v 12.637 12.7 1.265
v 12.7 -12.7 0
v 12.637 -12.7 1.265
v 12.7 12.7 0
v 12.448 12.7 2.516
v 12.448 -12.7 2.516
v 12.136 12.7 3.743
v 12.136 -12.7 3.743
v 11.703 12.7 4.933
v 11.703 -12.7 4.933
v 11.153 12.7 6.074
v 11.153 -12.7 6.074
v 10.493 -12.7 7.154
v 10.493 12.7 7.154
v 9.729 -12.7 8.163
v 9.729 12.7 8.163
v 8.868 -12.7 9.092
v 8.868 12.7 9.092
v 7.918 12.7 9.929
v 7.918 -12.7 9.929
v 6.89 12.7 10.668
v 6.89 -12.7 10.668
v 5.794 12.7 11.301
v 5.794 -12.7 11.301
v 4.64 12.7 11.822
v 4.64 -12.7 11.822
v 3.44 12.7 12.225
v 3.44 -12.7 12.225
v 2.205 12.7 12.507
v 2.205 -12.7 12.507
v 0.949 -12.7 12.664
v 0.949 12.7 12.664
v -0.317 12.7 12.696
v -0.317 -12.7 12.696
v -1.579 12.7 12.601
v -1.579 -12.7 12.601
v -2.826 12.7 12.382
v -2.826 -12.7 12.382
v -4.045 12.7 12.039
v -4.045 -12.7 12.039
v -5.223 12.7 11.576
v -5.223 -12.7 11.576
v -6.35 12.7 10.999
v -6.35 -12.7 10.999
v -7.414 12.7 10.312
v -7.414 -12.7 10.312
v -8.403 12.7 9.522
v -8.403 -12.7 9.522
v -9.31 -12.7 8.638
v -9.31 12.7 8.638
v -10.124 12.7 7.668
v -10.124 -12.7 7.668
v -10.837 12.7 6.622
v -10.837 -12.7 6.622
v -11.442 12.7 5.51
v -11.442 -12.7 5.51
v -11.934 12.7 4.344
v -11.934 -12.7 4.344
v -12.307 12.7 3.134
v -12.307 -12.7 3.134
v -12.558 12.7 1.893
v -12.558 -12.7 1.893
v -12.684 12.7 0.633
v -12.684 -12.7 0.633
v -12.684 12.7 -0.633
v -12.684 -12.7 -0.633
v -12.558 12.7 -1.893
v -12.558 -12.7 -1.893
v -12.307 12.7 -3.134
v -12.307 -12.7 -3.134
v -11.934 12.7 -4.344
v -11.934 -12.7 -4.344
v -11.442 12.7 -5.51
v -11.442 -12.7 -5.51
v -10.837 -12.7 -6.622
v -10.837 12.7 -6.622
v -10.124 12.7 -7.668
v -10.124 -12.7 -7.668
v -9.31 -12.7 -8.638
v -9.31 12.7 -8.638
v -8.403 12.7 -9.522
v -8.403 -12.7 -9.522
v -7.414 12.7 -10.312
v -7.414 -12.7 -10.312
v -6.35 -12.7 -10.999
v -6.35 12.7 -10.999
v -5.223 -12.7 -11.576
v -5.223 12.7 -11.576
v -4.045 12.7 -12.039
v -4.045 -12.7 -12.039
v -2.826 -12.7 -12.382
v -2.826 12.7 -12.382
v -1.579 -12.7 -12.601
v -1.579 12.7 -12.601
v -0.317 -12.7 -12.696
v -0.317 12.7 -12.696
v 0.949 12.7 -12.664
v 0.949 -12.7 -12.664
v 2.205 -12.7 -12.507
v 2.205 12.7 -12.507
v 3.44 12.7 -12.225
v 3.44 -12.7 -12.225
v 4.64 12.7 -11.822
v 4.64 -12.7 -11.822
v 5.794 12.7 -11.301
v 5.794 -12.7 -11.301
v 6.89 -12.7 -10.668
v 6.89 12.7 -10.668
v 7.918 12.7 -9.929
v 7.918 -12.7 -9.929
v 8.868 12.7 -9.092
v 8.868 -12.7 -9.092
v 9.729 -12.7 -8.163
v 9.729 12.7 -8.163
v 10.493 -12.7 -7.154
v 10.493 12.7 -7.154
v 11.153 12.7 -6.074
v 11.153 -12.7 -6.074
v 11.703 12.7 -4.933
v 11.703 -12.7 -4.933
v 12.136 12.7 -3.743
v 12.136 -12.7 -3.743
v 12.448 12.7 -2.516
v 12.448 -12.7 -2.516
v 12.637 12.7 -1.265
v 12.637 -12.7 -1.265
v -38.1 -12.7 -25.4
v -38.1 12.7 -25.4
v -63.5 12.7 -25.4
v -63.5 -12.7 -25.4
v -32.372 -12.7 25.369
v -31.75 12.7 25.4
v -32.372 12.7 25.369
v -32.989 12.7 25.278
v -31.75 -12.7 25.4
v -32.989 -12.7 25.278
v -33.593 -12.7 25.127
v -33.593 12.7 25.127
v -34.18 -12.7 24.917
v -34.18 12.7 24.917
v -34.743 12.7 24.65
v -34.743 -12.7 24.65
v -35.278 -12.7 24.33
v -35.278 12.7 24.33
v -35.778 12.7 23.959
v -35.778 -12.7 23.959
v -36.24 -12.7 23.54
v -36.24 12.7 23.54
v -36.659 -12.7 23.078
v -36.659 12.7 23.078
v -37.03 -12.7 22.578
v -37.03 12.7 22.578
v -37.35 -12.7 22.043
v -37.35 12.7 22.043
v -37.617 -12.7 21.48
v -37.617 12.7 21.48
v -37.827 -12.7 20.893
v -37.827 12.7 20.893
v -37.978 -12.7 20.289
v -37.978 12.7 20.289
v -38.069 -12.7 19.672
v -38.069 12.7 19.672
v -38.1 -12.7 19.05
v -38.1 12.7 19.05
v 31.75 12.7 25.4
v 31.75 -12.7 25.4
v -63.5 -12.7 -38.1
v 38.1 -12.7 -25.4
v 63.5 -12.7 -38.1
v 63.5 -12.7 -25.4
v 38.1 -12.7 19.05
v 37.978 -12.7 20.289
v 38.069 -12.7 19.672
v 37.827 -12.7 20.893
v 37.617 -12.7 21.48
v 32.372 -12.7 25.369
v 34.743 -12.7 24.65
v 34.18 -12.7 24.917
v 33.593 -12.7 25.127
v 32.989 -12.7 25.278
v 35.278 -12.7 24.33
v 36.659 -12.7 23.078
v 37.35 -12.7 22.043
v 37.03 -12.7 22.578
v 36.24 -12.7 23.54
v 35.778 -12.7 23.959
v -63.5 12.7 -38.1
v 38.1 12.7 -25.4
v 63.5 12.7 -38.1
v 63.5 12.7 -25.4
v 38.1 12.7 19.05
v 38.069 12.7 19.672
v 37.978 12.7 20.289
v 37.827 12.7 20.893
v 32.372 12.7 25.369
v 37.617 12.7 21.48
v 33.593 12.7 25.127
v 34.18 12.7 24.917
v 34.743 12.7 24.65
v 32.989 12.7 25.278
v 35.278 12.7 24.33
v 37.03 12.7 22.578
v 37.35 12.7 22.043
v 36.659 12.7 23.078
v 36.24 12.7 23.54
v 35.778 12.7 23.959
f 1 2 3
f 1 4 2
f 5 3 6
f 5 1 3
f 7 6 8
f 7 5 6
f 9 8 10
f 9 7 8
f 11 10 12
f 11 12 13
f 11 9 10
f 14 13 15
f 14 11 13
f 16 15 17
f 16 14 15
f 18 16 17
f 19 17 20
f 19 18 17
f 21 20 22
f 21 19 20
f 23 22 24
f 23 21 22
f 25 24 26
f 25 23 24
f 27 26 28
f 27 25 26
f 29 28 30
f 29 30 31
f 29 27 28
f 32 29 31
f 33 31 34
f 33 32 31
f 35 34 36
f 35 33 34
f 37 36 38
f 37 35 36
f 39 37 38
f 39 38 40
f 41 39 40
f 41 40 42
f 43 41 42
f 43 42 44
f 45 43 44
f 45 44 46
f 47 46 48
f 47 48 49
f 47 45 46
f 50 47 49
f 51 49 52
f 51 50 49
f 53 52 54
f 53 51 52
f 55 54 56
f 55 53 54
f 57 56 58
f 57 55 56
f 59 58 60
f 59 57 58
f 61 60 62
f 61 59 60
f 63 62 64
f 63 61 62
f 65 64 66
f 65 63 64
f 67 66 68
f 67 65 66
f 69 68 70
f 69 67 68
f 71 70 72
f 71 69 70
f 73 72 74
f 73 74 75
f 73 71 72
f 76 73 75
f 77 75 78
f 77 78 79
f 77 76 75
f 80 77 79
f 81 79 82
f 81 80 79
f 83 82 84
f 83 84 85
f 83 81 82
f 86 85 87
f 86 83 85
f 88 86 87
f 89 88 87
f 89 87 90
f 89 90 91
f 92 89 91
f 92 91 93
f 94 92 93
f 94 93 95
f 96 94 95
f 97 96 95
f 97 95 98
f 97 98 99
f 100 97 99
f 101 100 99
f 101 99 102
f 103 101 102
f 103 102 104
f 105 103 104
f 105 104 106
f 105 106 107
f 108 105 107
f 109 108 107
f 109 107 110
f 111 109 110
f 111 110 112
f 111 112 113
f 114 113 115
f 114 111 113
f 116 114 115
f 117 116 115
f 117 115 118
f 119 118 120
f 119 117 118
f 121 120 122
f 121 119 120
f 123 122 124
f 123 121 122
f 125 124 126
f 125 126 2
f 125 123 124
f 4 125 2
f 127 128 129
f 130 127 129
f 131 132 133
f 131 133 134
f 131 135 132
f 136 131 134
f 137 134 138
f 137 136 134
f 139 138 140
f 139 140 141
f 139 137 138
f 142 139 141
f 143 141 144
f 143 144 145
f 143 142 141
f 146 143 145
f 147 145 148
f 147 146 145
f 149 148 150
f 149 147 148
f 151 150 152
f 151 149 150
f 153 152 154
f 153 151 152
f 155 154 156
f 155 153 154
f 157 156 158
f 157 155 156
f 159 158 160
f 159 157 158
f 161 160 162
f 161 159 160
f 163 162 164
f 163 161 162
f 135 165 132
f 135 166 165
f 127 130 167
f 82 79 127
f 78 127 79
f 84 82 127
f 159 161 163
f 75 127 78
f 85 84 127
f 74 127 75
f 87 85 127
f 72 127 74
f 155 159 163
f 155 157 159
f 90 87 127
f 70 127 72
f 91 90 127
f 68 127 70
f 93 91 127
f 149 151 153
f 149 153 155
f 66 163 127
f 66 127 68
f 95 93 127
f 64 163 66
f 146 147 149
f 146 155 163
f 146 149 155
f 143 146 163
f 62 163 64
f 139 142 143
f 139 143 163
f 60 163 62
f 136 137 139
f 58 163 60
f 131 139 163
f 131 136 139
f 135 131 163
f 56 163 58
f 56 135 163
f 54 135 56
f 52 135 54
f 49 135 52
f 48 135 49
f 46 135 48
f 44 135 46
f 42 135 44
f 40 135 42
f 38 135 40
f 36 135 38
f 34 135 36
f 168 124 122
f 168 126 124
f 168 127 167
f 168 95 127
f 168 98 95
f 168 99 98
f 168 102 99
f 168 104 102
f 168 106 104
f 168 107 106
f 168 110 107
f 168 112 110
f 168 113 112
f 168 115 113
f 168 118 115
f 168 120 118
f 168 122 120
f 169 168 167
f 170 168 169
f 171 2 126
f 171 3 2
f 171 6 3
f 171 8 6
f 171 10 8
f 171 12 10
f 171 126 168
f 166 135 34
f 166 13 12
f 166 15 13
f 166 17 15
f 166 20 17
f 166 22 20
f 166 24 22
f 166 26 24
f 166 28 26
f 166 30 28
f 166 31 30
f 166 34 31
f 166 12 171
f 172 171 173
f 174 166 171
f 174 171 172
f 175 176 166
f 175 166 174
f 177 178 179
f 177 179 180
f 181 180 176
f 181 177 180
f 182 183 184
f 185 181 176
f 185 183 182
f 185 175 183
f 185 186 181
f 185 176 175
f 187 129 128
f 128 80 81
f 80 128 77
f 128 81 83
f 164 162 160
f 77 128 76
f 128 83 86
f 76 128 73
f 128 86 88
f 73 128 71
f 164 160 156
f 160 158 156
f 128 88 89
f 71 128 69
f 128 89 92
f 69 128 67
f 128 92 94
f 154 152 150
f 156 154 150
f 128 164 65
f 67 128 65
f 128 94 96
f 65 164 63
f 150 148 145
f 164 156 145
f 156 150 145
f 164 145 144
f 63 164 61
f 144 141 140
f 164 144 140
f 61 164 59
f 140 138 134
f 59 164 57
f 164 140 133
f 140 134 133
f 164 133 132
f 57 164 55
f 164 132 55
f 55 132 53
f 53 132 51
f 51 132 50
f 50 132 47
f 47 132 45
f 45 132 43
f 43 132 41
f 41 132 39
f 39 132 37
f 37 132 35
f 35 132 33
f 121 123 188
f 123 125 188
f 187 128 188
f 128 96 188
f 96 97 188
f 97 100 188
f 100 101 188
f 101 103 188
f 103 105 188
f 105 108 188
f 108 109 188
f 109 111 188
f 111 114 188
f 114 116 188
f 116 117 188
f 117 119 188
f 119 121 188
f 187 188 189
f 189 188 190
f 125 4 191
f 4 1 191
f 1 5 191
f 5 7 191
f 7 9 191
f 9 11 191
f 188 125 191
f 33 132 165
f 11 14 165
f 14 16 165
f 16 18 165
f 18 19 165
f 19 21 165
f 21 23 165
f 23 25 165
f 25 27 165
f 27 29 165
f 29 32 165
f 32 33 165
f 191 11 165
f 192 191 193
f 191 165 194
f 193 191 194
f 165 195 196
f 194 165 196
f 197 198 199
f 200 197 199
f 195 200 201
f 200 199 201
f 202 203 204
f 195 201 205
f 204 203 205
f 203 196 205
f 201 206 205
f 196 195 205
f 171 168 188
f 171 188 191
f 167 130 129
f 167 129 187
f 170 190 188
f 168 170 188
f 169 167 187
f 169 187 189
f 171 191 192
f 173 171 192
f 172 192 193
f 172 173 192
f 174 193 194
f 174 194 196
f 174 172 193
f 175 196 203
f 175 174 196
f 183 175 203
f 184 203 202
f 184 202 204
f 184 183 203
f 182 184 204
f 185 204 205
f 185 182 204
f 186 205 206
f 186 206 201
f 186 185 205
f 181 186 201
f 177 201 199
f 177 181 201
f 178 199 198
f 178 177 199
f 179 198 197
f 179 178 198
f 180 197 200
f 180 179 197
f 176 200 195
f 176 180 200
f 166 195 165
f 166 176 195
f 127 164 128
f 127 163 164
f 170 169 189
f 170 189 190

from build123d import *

# Parameters (mm, degrees)
F0_R     = 12.7
F1_DEPTH = 12.7


with BuildPart() as f1:
    # F0 (on Front) → F1 (new body, symmetric)
    with BuildSketch(Plane.XZ):
        with BuildLine():
            Line((-38.1, 19.05), (-38.1, -25.4))
            Line((-38.1, -25.4), (38.1, -25.4))
            Line((38.1, -25.4), (38.1, 19.05))
            ThreePointArc((38.1, 19.05), (36.240128, 23.540128), (31.75, 25.4))
            Line((31.75, 25.4), (-31.75, 25.4))
            ThreePointArc((-31.75, 25.4), (-36.240128, 23.540128), (-38.1, 19.05))
        make_face()
        Circle(F0_R, mode=Mode.SUBTRACT)
        Polygon((-38.1, -25.4), (-63.5, -25.4), (-63.5, -38.1), (63.5, -38.1), (63.5, -25.4), (38.1, -25.4), align=None)
    extrude(amount=F1_DEPTH, both=True)


solid = f1.part
